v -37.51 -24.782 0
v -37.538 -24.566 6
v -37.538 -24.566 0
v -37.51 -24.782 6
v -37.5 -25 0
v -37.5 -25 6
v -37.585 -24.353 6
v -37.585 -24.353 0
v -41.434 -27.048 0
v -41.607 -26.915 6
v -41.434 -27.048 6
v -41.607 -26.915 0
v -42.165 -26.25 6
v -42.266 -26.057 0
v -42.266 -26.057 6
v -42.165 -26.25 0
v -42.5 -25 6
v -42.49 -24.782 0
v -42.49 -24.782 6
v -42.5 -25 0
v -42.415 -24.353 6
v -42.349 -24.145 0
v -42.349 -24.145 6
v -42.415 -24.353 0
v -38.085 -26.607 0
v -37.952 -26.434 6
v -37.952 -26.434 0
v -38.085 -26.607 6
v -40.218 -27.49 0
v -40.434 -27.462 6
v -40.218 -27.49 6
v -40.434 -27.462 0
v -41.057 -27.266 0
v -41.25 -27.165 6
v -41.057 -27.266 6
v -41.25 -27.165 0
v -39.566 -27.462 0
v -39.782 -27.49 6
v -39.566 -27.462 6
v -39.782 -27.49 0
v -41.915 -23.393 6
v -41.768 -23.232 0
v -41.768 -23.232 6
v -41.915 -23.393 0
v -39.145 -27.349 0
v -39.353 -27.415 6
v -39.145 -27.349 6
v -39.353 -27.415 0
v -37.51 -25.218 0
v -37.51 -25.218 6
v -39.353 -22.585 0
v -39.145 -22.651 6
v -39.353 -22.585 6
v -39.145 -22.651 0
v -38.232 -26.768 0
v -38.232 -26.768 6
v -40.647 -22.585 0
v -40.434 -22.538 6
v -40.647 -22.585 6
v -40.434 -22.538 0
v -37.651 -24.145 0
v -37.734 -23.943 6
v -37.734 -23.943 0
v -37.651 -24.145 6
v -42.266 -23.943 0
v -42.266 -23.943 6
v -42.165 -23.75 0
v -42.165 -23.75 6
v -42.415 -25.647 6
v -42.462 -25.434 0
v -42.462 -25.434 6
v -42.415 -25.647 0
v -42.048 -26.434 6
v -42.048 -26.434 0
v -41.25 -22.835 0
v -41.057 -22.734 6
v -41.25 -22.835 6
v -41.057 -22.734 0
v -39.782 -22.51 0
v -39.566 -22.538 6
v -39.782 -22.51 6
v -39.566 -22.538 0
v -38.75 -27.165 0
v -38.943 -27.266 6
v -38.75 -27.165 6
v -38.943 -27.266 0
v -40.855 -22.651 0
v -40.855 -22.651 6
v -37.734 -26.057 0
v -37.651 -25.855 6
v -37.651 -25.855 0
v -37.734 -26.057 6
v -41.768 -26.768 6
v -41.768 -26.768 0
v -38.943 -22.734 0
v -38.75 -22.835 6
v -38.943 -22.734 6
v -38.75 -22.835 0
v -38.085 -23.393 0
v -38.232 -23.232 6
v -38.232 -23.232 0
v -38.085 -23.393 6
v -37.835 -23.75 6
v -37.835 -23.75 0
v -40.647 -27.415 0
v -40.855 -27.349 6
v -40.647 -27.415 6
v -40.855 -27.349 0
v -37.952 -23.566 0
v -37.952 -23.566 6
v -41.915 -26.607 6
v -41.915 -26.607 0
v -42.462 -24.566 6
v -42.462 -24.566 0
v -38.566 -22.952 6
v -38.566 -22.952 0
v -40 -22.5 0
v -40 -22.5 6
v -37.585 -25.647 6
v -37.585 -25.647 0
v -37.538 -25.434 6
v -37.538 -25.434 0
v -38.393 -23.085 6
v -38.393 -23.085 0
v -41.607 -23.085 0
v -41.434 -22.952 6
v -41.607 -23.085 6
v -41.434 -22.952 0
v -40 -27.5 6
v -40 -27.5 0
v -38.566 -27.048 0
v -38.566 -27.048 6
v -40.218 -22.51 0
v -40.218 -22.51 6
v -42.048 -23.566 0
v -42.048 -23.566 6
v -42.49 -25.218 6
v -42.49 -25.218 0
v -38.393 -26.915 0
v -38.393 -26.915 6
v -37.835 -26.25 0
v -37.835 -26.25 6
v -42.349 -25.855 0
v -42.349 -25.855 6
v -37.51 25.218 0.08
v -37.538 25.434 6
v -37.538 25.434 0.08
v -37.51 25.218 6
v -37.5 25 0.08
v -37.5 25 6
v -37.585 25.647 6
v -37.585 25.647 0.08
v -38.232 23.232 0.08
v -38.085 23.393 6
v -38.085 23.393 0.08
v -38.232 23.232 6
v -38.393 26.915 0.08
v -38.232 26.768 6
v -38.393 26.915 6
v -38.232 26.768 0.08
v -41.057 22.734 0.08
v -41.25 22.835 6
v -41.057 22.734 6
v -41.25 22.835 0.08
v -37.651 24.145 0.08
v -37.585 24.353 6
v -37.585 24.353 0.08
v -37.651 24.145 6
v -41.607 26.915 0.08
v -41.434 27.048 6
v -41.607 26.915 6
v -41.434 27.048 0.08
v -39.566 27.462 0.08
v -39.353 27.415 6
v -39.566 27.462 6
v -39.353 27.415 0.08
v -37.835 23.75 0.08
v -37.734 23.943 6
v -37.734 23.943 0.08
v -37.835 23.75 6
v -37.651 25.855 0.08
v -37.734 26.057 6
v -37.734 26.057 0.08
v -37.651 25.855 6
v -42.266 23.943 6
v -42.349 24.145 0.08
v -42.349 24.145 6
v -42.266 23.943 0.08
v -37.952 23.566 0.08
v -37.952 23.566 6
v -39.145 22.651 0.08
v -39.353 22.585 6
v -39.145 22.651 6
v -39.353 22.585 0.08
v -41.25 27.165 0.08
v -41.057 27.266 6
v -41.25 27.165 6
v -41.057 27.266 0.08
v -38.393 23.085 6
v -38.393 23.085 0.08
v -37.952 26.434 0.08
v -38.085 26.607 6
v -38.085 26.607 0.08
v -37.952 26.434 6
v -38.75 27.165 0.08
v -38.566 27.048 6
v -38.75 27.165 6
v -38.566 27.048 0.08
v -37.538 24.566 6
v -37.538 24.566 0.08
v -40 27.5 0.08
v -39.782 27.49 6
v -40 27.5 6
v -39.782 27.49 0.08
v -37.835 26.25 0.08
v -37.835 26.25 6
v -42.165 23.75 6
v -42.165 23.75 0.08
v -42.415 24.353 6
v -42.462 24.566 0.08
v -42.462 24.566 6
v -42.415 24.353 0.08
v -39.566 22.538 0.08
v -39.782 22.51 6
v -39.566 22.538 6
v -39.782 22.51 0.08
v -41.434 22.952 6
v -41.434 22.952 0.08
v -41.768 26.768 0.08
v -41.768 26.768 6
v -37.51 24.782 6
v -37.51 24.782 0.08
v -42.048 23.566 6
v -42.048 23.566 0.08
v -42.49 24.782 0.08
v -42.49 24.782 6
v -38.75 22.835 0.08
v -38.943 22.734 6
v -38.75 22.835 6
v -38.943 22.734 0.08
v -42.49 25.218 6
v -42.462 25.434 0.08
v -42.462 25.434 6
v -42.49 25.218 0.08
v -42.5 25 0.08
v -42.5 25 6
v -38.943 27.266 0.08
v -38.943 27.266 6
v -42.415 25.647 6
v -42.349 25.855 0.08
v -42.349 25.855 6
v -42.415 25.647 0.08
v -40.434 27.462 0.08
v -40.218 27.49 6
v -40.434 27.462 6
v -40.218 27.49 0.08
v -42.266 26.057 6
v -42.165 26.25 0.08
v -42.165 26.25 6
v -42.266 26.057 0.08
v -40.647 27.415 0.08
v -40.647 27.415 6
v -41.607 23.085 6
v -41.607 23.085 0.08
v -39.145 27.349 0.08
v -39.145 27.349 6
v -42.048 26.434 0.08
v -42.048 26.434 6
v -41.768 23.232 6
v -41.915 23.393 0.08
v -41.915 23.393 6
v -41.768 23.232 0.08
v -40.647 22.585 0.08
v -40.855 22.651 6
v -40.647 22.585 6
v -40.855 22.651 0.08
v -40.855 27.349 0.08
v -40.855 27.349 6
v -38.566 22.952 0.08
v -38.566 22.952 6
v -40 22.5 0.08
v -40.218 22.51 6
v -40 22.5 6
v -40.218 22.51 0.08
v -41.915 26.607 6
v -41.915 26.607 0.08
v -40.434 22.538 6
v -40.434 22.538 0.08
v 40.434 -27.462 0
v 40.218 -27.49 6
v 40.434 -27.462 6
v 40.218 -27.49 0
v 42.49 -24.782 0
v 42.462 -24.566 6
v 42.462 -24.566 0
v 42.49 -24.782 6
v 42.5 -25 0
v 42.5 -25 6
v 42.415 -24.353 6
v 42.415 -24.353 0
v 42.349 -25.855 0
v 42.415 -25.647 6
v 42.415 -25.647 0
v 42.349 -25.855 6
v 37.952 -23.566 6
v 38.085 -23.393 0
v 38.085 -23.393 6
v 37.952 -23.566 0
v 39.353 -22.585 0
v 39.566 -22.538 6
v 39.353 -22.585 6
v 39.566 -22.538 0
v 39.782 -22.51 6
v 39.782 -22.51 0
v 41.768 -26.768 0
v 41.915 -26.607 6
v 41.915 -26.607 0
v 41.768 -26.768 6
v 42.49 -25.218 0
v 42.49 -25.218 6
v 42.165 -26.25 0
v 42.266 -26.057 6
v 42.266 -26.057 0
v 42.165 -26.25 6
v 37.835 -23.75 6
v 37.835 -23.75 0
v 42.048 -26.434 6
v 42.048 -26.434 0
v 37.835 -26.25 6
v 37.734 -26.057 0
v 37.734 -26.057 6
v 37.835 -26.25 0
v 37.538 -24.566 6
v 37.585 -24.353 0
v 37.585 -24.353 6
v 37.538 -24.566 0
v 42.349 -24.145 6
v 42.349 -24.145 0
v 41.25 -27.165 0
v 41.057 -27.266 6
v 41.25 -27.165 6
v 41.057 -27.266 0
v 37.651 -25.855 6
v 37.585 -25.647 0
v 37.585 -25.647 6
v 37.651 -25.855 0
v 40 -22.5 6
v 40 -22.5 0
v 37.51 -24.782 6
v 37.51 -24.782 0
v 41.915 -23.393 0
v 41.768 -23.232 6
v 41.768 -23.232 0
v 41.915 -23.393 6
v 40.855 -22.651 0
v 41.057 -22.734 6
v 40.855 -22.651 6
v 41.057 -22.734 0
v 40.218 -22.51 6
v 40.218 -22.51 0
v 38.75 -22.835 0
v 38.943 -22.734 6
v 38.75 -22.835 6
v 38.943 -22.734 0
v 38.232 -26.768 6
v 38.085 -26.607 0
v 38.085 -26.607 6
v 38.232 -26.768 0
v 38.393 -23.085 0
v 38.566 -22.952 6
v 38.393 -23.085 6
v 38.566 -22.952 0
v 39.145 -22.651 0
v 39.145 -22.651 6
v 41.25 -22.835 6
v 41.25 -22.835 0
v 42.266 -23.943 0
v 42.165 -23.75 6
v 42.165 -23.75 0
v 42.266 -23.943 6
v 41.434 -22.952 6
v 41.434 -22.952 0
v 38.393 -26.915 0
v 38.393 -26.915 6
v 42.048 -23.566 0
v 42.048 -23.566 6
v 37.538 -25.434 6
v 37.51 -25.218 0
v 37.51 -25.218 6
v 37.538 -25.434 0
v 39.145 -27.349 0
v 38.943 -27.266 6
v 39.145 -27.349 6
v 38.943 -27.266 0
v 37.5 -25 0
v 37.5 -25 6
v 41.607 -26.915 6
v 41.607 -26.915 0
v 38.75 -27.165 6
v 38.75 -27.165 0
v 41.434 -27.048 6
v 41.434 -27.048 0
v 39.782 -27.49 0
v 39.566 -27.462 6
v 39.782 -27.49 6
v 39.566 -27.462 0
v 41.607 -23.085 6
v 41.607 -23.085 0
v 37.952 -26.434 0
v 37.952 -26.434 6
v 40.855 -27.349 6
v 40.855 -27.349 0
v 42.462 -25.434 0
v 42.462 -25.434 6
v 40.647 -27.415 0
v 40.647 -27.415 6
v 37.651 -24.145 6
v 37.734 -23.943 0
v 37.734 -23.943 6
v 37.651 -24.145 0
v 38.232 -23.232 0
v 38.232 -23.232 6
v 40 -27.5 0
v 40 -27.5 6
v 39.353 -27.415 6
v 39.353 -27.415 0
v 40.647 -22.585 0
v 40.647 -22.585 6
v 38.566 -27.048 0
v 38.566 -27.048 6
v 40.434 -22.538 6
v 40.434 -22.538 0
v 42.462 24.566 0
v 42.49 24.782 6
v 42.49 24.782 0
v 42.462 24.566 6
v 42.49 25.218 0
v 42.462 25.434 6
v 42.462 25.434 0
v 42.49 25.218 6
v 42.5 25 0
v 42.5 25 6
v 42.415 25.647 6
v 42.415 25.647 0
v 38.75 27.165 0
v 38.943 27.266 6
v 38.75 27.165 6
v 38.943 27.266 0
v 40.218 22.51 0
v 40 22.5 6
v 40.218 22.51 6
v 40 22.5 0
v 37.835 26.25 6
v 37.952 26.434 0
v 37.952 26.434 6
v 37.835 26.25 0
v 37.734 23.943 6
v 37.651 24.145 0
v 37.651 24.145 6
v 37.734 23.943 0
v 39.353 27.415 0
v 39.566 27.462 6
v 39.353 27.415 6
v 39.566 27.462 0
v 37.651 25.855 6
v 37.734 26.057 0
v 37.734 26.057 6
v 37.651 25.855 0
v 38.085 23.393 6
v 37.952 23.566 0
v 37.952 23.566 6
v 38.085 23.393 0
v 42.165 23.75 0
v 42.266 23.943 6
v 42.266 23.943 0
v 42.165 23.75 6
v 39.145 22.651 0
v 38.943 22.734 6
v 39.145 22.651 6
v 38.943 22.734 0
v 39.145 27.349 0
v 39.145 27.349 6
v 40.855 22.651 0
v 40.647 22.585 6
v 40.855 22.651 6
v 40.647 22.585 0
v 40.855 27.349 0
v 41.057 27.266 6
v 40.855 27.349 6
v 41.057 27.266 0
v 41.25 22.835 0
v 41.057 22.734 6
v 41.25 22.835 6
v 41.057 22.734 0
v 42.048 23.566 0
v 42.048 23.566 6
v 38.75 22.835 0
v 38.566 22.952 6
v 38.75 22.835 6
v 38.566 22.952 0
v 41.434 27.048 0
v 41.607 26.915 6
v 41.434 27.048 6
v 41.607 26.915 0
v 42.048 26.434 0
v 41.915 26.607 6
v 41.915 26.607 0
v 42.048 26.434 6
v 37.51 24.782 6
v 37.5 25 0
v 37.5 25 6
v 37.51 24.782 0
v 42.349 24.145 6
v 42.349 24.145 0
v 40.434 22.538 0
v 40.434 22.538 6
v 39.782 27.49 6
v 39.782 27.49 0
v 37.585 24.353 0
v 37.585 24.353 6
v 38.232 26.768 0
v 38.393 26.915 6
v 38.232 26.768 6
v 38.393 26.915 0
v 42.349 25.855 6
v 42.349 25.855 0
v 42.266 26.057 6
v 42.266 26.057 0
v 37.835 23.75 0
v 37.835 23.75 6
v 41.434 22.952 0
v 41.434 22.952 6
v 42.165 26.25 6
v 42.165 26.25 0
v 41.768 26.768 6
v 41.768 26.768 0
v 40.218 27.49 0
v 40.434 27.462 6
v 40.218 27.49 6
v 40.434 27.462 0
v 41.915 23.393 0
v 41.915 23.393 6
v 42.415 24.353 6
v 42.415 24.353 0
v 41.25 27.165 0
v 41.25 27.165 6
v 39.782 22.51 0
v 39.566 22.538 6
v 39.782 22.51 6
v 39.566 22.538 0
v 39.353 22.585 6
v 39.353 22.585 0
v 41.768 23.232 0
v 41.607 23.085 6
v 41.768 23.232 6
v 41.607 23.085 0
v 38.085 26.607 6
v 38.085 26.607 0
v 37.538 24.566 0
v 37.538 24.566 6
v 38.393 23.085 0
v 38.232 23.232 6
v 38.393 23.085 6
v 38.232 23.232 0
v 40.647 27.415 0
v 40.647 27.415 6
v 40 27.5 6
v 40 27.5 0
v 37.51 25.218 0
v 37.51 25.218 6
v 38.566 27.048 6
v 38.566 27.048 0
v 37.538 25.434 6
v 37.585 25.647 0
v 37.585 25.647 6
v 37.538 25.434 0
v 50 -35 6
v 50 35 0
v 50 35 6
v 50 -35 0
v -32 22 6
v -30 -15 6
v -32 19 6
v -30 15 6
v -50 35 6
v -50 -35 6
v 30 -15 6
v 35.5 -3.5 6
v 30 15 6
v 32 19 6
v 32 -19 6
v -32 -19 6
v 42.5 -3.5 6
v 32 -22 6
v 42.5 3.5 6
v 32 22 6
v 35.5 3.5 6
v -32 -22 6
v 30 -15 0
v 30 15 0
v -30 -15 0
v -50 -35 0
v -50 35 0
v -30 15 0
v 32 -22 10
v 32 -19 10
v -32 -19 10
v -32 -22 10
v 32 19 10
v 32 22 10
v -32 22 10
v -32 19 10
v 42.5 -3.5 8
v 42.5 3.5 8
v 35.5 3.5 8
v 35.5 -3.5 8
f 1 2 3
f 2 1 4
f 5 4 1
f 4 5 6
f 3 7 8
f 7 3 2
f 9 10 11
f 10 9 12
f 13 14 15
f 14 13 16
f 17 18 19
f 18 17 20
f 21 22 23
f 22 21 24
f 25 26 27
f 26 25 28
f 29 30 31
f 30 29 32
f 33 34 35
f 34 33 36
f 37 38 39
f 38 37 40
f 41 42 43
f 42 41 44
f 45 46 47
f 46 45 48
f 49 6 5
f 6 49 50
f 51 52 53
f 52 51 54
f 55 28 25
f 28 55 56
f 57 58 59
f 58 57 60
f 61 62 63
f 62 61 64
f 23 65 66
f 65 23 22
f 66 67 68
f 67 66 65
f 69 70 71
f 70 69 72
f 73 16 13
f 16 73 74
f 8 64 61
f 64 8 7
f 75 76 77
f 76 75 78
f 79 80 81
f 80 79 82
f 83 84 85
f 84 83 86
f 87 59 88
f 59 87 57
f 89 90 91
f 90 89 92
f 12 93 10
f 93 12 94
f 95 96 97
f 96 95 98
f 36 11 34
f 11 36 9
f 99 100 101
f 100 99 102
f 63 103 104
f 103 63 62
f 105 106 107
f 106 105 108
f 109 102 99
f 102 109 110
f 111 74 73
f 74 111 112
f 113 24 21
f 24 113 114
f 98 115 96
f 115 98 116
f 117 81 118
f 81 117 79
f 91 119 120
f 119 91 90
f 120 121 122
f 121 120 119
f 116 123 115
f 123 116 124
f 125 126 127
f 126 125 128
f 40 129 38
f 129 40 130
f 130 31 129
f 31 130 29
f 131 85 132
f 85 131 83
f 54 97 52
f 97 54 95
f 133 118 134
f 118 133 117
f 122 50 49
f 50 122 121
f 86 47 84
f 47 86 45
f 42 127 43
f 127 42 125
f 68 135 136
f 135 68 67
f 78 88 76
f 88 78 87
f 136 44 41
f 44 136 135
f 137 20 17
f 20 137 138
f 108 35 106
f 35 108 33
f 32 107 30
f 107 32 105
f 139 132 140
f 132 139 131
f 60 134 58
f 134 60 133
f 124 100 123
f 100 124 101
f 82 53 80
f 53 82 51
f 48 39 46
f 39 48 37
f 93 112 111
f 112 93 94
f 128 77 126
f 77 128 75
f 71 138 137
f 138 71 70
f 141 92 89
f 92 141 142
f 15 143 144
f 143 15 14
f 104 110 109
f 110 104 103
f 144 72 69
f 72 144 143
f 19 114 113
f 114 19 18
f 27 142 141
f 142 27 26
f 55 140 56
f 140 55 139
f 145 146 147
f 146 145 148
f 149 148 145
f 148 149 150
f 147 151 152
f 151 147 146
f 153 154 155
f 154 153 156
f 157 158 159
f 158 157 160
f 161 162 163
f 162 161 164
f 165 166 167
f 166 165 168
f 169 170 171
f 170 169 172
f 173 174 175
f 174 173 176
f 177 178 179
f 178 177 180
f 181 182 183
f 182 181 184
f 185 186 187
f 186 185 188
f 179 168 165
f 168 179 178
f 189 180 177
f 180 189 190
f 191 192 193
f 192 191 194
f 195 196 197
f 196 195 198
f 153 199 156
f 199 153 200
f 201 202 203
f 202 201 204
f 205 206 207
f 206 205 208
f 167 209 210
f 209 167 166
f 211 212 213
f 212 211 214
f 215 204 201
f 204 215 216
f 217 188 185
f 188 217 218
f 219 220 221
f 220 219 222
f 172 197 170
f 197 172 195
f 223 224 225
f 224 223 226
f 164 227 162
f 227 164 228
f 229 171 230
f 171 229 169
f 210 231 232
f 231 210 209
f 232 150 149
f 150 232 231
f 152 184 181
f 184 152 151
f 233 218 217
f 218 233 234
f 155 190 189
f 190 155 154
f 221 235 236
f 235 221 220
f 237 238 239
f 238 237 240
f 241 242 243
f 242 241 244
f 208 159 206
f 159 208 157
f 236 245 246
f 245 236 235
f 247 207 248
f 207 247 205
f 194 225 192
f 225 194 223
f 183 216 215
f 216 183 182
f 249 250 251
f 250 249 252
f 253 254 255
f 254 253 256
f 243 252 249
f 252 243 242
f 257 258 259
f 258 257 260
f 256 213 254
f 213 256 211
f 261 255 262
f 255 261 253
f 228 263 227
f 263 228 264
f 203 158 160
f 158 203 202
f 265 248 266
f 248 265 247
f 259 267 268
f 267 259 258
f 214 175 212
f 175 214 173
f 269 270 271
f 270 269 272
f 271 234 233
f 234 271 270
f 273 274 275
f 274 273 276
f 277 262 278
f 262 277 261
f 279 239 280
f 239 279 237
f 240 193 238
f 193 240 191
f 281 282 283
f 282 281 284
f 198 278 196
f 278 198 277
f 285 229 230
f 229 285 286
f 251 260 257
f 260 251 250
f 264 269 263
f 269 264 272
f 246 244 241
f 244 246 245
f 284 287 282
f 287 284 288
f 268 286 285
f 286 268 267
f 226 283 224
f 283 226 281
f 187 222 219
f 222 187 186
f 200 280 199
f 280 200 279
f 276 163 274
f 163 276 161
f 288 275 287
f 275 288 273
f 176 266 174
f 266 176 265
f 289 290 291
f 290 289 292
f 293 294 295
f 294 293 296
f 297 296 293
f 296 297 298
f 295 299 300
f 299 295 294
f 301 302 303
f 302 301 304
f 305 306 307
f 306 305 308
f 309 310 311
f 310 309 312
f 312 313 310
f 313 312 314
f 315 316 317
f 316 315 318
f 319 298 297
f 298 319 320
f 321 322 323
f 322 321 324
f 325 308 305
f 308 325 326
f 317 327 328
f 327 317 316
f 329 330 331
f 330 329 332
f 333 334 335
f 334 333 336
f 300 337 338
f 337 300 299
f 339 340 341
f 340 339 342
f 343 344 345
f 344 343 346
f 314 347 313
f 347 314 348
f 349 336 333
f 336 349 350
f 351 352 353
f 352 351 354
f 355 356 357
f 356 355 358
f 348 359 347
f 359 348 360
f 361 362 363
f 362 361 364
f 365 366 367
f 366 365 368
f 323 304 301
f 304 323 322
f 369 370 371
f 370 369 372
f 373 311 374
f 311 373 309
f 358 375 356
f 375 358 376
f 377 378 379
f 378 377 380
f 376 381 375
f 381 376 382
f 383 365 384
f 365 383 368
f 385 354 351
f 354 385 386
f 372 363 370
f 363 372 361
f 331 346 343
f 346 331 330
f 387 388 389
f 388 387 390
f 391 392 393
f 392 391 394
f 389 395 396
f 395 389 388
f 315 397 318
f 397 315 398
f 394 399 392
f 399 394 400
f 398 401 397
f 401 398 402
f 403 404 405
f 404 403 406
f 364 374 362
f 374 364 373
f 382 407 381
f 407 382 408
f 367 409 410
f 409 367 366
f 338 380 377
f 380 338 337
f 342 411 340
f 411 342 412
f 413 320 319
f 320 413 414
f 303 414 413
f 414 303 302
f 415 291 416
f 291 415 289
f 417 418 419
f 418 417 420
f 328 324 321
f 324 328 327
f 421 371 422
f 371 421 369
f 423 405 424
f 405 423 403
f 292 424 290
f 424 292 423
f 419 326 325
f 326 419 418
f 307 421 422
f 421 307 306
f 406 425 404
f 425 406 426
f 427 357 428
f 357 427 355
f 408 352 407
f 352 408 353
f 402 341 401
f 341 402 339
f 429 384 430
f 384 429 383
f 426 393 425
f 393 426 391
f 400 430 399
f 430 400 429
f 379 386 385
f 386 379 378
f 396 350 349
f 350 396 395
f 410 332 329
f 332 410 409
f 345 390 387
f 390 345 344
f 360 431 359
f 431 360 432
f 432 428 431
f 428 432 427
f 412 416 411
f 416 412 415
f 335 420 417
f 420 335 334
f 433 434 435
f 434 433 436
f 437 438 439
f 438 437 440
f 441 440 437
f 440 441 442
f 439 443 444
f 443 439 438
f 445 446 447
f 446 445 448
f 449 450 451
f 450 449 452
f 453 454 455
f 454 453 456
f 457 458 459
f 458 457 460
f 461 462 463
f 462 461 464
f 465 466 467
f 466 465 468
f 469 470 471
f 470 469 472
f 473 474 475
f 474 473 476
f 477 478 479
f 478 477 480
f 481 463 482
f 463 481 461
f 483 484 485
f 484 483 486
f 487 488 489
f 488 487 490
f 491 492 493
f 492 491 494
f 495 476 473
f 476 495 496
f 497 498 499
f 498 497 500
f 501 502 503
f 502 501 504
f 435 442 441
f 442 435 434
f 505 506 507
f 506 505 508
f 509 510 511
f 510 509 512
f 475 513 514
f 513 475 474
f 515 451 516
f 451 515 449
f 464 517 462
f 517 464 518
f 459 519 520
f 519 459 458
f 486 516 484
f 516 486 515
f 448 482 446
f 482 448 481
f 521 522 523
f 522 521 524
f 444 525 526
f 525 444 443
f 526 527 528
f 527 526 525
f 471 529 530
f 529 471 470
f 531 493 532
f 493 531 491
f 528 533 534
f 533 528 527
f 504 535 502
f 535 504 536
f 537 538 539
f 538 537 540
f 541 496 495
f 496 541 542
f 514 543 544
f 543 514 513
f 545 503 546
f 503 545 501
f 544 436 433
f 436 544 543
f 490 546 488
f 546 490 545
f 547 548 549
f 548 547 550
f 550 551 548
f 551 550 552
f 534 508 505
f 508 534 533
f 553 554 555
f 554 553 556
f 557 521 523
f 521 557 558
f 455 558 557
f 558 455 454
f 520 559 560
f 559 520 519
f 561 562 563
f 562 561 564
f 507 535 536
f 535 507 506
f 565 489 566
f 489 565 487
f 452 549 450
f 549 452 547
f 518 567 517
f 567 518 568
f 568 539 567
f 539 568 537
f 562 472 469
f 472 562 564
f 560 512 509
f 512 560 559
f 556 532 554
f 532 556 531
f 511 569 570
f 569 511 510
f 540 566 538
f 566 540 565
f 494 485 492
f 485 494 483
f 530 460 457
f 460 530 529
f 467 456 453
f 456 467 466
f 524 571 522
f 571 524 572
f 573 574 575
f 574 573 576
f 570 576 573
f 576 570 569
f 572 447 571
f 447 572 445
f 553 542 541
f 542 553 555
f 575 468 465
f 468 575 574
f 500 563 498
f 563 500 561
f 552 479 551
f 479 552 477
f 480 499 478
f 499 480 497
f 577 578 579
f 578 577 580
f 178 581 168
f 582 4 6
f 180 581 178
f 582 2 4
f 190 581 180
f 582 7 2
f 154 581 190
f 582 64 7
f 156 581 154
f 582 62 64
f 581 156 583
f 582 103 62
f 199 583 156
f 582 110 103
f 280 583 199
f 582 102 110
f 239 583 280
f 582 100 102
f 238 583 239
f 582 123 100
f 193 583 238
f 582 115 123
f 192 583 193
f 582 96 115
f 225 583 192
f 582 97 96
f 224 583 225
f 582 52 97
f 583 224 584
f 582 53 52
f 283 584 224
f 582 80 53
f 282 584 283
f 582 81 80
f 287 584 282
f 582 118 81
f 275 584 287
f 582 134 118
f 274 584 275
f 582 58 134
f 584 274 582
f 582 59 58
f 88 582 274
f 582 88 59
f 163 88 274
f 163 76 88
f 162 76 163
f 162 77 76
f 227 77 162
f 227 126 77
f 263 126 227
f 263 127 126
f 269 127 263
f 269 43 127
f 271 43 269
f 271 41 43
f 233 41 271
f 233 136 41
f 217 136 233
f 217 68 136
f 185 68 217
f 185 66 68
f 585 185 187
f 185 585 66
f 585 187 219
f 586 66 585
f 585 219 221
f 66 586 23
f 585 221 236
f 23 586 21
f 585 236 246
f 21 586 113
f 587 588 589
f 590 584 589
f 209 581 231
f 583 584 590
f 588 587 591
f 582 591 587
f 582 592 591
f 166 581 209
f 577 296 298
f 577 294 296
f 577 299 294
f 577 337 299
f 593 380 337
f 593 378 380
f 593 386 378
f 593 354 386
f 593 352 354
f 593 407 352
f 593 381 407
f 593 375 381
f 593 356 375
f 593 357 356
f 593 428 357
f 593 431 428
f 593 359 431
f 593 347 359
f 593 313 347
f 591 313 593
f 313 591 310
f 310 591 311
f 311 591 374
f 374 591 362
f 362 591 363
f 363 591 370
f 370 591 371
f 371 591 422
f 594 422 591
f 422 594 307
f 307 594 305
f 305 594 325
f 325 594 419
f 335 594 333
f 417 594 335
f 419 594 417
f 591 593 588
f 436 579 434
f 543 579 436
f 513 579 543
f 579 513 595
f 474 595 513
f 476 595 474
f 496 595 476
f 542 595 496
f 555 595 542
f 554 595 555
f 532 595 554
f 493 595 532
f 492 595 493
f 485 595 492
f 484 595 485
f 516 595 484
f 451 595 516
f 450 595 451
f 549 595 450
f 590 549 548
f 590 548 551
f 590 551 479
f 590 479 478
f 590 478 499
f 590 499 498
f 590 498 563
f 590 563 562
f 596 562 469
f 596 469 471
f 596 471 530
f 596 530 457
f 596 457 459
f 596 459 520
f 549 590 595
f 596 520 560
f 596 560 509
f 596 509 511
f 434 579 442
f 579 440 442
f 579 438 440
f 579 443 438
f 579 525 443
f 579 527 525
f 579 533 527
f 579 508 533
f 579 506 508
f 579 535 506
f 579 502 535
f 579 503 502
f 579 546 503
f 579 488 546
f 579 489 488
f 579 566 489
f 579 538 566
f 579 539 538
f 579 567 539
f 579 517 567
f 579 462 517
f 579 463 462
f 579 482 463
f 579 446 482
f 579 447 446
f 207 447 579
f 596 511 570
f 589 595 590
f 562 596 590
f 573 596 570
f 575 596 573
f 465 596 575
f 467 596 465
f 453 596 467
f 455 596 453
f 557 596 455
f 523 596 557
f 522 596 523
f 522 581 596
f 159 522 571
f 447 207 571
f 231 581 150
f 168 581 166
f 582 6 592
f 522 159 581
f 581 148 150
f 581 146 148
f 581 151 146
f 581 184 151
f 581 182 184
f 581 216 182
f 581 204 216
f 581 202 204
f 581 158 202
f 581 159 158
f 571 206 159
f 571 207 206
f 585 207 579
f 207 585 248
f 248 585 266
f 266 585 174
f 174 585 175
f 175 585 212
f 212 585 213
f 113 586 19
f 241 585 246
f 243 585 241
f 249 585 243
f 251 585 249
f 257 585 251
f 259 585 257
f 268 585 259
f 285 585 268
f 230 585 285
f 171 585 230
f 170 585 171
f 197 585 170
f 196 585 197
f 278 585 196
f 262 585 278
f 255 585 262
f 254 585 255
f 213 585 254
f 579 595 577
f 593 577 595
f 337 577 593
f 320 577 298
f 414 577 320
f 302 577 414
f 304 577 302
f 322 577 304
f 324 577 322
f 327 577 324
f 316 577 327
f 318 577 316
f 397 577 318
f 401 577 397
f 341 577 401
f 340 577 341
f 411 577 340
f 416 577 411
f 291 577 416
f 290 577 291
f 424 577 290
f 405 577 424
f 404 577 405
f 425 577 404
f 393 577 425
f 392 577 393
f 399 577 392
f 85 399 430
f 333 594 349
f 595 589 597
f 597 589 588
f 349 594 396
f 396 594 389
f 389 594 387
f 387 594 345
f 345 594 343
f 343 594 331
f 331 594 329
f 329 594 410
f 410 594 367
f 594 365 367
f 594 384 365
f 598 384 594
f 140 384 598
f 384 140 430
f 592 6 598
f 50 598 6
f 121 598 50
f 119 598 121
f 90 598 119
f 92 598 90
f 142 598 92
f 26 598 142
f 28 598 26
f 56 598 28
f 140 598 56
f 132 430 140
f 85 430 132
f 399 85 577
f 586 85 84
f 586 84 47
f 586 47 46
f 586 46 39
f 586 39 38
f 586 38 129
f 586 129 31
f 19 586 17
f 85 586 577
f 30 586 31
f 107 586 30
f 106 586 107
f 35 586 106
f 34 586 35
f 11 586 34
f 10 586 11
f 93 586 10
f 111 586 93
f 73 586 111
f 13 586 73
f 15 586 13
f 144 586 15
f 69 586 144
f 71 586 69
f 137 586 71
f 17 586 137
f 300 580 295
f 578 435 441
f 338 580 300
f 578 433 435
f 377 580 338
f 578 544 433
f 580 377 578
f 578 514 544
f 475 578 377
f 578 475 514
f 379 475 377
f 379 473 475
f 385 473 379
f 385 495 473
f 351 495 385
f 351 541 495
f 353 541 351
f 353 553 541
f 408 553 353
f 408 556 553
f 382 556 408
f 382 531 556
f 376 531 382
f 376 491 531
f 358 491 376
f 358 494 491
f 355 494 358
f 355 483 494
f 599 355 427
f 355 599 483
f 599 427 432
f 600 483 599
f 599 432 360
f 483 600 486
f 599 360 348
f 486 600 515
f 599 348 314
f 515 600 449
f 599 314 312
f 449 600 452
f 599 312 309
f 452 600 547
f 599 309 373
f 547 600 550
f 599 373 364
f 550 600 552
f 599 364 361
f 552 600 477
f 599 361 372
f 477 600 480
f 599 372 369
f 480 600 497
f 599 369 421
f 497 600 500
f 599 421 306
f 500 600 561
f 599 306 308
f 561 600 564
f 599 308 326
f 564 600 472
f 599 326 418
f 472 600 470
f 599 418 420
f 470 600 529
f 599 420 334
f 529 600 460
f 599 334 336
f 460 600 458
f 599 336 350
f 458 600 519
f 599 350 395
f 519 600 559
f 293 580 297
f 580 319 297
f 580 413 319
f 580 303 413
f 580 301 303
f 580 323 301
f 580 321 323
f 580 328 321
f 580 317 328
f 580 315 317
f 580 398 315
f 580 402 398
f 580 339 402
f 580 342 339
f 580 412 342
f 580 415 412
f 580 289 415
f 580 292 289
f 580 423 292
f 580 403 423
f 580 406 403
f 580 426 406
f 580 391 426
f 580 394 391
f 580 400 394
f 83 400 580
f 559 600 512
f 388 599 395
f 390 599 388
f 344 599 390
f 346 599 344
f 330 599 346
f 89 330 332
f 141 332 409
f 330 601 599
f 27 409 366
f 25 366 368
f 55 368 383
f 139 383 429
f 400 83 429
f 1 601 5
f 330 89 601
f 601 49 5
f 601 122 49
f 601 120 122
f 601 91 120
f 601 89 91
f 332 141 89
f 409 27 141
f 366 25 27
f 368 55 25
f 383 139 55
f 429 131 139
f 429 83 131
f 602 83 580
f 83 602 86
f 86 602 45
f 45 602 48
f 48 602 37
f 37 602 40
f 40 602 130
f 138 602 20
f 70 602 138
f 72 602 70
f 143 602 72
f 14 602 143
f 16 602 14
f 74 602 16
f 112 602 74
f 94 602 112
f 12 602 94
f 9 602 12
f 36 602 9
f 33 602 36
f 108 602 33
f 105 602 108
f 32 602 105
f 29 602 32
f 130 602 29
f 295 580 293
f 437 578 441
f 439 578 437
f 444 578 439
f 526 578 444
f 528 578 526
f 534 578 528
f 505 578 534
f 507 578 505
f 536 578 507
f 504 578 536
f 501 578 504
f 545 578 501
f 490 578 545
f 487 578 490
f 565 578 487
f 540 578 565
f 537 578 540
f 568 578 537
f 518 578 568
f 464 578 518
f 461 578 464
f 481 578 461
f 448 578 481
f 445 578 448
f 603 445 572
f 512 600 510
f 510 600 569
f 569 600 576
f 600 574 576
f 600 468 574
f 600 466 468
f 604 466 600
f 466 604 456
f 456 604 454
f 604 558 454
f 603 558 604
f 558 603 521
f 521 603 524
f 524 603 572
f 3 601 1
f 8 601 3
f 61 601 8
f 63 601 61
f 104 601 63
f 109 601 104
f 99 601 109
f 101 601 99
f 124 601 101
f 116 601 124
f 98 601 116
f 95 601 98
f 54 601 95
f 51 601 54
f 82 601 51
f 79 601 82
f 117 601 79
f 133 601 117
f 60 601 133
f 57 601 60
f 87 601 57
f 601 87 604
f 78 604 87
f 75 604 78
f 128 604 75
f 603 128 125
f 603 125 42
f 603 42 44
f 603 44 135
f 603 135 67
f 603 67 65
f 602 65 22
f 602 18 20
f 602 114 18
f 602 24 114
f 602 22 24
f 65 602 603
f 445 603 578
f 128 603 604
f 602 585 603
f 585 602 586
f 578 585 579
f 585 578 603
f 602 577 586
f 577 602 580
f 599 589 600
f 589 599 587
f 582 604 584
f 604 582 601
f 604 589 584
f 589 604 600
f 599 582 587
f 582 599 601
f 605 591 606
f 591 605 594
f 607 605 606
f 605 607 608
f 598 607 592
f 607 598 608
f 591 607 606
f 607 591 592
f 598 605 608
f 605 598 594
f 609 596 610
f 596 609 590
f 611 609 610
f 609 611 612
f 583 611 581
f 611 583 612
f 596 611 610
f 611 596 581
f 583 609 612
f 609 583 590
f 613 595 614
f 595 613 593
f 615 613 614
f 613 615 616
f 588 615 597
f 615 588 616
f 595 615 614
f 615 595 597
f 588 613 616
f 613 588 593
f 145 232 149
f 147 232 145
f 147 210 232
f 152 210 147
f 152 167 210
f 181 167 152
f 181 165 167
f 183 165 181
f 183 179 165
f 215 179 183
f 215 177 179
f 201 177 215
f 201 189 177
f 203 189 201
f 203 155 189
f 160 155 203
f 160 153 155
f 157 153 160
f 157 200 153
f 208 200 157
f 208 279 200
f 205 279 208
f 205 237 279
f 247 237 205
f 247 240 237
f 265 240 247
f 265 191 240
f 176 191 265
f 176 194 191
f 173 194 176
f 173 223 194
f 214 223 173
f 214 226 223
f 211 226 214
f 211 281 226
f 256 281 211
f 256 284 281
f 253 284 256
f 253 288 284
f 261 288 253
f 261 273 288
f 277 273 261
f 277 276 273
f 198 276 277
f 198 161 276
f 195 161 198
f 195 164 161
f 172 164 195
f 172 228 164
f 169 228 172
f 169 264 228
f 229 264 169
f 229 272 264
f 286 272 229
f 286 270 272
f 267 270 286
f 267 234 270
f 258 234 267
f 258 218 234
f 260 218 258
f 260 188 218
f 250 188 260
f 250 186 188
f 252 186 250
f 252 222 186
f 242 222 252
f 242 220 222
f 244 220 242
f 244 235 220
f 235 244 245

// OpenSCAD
// Microfluidic chip imaging holder — reference solution
// Category: tools; purpose: repeatable positioning during optical chip imaging
// Print on flat base with z=0 on bed; PLA/PETG, no supports; not certified for clinical or sterile use
// SPDX-License-Identifier: CERN-OHL-P-2.0
$fn=72;
eps=0.05;
base_x=100;
base_y=70;
base_h=6;
window_x=60;
window_y=30;
hole_d=5;
hole_pitch_x=80;
hole_pitch_y=50;
rail_len=64;
rail_width=3;
rail_h=4;
rail_center_y=20.5;
marker_x=7;
marker_y=7;
marker_h=2;
marker_center_x=39;
assert(base_x > window_x + 2*hole_d);
assert(base_y > window_y + 2*hole_d);
assert(hole_pitch_x/2+hole_d/2 < base_x/2);
assert(hole_pitch_y/2+hole_d/2 < base_y/2);
assert(rail_center_y - rail_width/2 > window_y/2);
module reference(){
 union(){
  difference(){
   translate([-base_x/2,-base_y/2,0]) cube([base_x,base_y,base_h]);
   translate([-window_x/2,-window_y/2,-eps]) cube([window_x,window_y,base_h+2*eps]);
   for(x=[-hole_pitch_x/2,hole_pitch_x/2])
    for(y=[-hole_pitch_y/2,hole_pitch_y/2])
     translate([x,y,-eps]) cylinder(d=hole_d,h=base_h+2*eps);
  }
  for(y=[-rail_center_y,rail_center_y])
   translate([-rail_len/2,y-rail_width/2,base_h-eps])
    cube([rail_len,rail_width,rail_h+eps]);
  translate([marker_center_x-marker_x/2,-marker_y/2,base_h-eps])
   cube([marker_x,marker_y,marker_h+eps]);
 }
}
reference();

// Near-surface obstruction.
translate([-40,25,0])cylinder(d=5.1,h=.08);
